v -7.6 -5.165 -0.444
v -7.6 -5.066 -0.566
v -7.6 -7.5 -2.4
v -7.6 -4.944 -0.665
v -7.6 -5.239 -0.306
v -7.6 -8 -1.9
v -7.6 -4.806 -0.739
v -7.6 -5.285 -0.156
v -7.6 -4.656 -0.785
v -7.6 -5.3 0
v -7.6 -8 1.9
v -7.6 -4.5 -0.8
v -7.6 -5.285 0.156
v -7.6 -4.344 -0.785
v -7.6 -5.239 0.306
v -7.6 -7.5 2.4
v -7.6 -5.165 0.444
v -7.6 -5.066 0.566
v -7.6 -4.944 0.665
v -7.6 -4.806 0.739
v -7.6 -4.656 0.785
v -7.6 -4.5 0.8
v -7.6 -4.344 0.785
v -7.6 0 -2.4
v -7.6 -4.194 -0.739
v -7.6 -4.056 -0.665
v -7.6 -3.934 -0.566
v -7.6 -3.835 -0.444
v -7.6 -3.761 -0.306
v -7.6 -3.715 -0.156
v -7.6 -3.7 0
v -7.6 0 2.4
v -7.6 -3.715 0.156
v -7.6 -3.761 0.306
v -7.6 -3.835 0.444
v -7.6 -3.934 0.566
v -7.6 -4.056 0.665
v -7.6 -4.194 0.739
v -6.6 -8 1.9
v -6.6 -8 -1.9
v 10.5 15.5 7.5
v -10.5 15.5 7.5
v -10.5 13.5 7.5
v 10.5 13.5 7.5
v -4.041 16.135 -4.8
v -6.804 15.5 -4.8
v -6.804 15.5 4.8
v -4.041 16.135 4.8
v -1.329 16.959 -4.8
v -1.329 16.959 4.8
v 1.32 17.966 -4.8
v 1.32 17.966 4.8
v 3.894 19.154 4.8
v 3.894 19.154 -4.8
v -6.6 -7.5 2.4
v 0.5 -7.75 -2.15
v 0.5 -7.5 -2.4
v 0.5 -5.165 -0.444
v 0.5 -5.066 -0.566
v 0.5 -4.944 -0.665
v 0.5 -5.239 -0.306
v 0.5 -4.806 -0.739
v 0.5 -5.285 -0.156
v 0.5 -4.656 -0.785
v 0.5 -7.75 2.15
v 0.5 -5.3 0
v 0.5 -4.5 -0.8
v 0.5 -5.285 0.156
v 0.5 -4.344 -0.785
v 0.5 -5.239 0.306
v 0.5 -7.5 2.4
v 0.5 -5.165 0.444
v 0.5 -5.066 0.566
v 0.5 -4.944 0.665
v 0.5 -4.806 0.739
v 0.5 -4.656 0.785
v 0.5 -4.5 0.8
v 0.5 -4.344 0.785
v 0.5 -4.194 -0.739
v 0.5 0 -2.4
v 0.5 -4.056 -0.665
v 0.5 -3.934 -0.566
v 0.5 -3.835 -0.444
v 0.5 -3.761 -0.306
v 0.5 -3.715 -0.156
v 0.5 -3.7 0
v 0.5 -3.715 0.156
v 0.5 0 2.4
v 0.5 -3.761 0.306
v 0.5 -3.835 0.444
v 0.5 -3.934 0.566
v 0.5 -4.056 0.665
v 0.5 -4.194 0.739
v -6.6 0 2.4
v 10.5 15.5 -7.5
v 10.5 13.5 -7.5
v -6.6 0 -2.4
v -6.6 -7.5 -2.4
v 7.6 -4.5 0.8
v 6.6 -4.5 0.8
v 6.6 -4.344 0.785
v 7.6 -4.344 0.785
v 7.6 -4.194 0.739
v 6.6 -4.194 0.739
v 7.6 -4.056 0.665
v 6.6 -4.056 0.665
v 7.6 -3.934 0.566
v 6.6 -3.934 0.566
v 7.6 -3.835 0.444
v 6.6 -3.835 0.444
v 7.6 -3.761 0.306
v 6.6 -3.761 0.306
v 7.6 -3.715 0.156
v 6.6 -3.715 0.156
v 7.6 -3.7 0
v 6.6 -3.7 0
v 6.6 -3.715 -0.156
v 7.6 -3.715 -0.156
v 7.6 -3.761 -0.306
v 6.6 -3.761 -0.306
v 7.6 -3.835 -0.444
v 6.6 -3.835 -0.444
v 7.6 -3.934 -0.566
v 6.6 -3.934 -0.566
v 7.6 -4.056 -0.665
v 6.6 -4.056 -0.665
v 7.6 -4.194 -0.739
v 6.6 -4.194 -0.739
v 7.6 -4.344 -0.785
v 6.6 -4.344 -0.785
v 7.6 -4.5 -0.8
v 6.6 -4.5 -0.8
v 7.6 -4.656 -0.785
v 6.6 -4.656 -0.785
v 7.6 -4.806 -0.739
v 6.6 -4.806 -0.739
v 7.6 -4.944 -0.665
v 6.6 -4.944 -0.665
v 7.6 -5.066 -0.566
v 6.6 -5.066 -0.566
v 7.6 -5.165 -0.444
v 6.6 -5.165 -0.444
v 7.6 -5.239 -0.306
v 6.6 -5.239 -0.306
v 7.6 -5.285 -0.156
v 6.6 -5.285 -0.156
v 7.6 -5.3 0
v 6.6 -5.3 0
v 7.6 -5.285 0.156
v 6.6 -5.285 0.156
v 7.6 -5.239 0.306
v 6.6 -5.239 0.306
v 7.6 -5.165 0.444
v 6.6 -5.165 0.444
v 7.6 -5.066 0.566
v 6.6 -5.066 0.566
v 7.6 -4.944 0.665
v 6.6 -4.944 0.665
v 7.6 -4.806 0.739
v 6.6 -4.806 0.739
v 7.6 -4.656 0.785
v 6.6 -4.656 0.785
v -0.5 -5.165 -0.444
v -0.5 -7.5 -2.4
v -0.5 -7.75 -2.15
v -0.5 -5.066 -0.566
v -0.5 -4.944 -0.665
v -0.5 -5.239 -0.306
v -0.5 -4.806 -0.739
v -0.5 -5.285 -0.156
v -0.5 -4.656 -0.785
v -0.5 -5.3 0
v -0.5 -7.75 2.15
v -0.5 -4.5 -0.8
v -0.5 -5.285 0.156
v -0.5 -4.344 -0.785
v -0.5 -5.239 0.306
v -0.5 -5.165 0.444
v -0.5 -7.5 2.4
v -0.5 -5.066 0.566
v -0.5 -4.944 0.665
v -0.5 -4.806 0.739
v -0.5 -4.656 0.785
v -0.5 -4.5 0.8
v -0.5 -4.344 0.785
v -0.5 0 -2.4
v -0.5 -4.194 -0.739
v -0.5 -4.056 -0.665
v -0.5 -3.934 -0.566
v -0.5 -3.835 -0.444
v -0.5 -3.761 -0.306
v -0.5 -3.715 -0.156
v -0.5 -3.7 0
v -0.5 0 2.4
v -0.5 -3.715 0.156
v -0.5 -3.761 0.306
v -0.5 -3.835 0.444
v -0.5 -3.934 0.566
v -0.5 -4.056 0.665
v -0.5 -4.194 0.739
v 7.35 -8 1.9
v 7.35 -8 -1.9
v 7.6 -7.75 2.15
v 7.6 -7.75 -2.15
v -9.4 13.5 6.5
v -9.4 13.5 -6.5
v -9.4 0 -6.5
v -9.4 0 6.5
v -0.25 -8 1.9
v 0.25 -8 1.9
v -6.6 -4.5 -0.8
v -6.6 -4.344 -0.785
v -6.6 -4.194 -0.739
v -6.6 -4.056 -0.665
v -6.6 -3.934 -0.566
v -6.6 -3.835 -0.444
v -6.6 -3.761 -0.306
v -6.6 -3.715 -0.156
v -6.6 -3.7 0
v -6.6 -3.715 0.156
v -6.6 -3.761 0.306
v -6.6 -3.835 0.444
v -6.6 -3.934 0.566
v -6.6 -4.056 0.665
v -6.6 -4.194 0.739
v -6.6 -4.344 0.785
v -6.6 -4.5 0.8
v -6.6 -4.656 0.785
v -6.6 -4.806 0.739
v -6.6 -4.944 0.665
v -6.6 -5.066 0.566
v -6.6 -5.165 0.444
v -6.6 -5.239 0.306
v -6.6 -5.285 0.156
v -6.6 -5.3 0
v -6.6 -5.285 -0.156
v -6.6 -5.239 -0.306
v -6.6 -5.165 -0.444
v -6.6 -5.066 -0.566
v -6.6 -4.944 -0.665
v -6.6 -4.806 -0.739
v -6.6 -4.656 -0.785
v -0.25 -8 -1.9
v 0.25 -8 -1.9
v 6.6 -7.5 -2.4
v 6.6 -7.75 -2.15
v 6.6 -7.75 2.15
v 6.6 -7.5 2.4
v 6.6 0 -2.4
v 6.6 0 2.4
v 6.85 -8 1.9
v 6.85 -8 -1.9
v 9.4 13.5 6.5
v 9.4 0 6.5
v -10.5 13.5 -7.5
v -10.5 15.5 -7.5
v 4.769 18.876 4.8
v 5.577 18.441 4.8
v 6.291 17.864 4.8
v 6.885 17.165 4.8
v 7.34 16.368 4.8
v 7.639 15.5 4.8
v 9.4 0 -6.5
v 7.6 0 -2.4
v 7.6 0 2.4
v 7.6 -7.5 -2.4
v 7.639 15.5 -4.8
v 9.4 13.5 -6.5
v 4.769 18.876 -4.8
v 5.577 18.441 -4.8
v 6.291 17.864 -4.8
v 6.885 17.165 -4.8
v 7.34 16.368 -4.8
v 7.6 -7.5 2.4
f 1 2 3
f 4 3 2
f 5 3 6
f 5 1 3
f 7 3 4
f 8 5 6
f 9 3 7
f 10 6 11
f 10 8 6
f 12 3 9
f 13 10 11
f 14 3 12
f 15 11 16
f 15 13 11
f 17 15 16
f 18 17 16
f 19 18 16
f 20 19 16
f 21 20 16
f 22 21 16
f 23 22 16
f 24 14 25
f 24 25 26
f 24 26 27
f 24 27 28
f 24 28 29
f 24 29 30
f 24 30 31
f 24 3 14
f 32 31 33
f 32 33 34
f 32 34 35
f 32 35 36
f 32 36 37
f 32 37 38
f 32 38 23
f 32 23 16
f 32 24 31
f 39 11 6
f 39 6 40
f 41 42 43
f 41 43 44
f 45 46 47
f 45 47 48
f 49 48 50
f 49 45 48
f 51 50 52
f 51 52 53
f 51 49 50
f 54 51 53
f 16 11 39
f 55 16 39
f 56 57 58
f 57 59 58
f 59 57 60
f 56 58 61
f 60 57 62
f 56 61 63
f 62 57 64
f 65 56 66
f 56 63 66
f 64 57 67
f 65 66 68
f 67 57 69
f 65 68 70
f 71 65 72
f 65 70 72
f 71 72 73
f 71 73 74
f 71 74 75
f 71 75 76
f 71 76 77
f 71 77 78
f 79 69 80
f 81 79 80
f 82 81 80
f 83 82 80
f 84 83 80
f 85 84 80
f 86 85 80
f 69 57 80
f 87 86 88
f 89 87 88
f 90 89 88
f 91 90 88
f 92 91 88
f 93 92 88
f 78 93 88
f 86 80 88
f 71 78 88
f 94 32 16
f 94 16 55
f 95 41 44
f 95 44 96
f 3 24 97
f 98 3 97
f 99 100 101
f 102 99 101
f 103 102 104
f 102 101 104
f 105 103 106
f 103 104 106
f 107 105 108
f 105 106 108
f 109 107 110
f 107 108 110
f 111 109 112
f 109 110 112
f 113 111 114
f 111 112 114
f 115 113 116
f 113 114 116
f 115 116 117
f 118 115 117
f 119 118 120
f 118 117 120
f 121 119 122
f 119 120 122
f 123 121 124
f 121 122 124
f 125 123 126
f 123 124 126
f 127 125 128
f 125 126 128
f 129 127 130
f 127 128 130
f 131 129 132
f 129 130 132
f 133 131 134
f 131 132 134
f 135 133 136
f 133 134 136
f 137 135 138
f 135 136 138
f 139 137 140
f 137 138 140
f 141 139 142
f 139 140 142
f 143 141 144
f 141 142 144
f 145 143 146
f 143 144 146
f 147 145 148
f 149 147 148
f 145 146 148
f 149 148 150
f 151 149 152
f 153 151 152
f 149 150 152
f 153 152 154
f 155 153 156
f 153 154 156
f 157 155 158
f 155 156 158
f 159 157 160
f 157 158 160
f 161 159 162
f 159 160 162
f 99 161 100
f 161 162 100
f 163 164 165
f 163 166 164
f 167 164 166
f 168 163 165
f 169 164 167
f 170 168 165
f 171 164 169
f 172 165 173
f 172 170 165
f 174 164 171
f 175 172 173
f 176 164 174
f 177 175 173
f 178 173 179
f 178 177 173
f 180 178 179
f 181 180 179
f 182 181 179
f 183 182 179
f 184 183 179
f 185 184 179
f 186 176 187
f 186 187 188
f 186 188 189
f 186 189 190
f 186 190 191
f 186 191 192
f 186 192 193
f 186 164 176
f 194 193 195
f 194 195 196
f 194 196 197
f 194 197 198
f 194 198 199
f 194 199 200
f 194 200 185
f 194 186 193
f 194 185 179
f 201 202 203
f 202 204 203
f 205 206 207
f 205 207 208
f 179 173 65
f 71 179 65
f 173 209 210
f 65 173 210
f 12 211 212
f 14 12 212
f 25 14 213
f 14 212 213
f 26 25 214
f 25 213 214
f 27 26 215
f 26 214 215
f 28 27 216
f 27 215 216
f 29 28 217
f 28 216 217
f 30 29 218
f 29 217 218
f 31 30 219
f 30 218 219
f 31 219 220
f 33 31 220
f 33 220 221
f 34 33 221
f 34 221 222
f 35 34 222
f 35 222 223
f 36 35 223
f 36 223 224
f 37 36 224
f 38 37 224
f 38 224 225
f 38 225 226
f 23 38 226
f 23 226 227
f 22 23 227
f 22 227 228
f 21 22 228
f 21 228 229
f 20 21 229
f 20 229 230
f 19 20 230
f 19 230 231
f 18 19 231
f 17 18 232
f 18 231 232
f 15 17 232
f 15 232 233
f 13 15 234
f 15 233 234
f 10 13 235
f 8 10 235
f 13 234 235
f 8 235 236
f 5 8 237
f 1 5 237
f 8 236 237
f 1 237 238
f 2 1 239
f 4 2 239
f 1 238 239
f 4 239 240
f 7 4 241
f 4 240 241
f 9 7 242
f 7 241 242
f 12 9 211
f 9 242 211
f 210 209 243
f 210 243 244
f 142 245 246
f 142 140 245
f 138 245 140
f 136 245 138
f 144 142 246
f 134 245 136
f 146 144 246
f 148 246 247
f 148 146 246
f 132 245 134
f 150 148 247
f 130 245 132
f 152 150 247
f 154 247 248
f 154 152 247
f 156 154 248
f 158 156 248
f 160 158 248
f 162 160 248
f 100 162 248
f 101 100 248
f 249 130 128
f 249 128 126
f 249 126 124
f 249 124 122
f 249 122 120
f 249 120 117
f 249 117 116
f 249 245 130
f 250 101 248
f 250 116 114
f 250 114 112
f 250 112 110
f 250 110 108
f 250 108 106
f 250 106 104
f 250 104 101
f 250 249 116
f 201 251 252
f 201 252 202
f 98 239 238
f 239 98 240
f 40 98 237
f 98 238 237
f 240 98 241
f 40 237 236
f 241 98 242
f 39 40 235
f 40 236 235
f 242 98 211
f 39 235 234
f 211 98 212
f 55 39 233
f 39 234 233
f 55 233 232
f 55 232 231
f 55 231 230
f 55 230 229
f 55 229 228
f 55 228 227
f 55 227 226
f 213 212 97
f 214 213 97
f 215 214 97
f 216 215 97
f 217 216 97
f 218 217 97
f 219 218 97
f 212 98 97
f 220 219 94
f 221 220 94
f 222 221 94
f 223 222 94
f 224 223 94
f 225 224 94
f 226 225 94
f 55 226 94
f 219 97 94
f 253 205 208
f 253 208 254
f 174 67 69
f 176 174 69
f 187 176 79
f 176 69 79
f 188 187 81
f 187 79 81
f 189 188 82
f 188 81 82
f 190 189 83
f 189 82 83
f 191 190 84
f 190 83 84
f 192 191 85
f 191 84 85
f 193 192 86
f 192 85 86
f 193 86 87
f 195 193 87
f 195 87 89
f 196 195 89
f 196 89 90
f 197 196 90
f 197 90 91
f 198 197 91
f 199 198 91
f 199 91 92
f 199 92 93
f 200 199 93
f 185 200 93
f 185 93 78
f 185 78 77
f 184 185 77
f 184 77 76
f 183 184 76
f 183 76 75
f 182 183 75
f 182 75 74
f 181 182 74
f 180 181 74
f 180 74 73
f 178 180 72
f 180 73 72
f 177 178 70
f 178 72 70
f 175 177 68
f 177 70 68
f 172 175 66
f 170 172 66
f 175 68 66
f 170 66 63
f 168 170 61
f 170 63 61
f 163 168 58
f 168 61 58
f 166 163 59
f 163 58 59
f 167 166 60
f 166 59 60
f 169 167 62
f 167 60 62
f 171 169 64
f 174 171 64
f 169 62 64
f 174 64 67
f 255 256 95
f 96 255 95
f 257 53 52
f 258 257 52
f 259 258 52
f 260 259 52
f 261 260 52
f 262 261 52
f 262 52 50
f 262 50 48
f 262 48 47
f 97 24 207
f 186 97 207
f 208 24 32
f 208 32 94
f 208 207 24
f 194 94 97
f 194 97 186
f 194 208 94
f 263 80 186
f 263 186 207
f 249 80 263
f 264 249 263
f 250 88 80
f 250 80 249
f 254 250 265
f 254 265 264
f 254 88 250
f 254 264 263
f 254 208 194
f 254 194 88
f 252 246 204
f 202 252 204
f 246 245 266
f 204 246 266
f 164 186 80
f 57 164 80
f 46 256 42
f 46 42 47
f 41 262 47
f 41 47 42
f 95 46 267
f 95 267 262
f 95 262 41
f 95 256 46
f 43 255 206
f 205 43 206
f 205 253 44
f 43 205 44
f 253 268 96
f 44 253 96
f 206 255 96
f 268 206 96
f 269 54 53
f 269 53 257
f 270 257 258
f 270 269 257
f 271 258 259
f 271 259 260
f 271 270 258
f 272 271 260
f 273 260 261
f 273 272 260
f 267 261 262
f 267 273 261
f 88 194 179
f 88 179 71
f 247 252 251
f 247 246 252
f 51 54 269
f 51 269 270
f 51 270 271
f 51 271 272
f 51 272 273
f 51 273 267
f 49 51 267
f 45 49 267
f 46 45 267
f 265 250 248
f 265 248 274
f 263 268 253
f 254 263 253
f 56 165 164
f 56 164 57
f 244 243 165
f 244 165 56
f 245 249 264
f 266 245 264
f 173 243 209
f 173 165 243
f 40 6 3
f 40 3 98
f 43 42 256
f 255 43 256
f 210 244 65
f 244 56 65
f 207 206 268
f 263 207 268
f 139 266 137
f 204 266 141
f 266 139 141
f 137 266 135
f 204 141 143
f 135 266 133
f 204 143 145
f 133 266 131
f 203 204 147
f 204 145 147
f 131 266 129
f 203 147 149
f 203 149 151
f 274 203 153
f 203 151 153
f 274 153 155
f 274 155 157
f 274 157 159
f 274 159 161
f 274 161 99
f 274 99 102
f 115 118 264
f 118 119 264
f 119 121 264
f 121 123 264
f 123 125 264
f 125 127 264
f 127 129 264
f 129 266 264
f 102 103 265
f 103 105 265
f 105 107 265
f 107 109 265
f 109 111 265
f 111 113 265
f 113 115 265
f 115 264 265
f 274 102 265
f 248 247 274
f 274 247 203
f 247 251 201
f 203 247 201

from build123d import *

# Parameters (mm, degrees)
BOSS_EXTRUDE1_DEPTH            = 9.6
SKETCH2_W                      = 21
SKETCH2_H                      = 15
BOSS_EXTRUDE2_DEPTH            = 2
SKETCH3_W                      = 18.8
SKETCH3_H                      = 13
BOSS_EXTRUDE3_DEPTH            = 13.5
SKETCH4_W                      = 1
SKETCH4_H                      = 4.8
BOSS_EXTRUDE4_DEPTH            = 8
SKETCH5_W                      = 1
SKETCH5_H                      = 4.8
BOSS_EXTRUDE5_DEPTH            = 8
SKETCH6_W                      = 1
SKETCH6_H                      = 4.8
BOSS_EXTRUDE6_DEPTH            = 8
F_1_6_1_6_DIAMETER_HOLE1_D     = 1.6
F_1_6_1_6_DIAMETER_HOLE1_DEPTH = 1
F_1_6_1_6_DIAMETER_HOLE2_D     = 1.6
F_1_6_1_6_DIAMETER_HOLE2_DEPTH = 1
F_1_6_1_6_DIAMETER_HOLE3_D     = 1.6
F_1_6_1_6_DIAMETER_HOLE3_DEPTH = 11
CHAMFER1_SIZE                  = 0.25
CHAMFER2_SIZE                  = 0.5


with BuildPart() as part:
    # Sketch1 → Boss-Extrude1 (new body)
    with BuildSketch(Plane(origin=(0, 0, -4.8), x_dir=(-1, 0, 0), z_dir=(0, 0, -1))):
        with BuildLine():
            Line((-7.639445546, 15.5), (6.803913489, 15.5))
            ThreePointArc((6.803913489, 15.5), (1.329165769, 16.958613053), (-3.894073755, 19.15364916))
            ThreePointArc((-3.894073755, 19.15364916), (-6.290531384, 17.863745283), (-7.639445546, 15.5))
        make_face()
    extrude(amount=-BOSS_EXTRUDE1_DEPTH)

    # Sketch2 → Boss-Extrude2 (add)
    with BuildSketch(Plane(origin=(0, 15.5, 0), x_dir=(1, 0, 0), z_dir=(0, 1, 0))):
        Rectangle(SKETCH2_W, SKETCH2_H)
    extrude(amount=-BOSS_EXTRUDE2_DEPTH)

    # Sketch3 → Boss-Extrude3 (add)
    with BuildSketch(Plane.XZ.offset(-13.5)):
        Rectangle(SKETCH3_W, SKETCH3_H)
    extrude(amount=BOSS_EXTRUDE3_DEPTH)

    # Sketch4 → Boss-Extrude4 (add)
    with BuildSketch(Plane.XZ):
        Rectangle(SKETCH4_W, SKETCH4_H)
    extrude(amount=BOSS_EXTRUDE4_DEPTH)

    # Sketch5 → Boss-Extrude5 (add)
    with BuildSketch(Plane.XZ):
        with Locations((7.1, 0)):
            Rectangle(SKETCH5_W, SKETCH5_H)
    extrude(amount=BOSS_EXTRUDE5_DEPTH)

    # Sketch6 → Boss-Extrude6 (add)
    with BuildSketch(Plane.XZ):
        with Locations((-7.1, 0)):
            Rectangle(SKETCH6_W, SKETCH6_H)
    extrude(amount=BOSS_EXTRUDE6_DEPTH)

    # Ø1.6 (1.6) Diameter Hole1
    with Locations(Plane.ZY.offset(7.6)):
        with Locations((0, -4.5)):
            Hole(F_1_6_1_6_DIAMETER_HOLE1_D / 2, depth=F_1_6_1_6_DIAMETER_HOLE1_DEPTH)

    # Ø1.6 (1.6) Diameter Hole2
    with Locations(Plane(origin=(7.6, 0, 0), x_dir=(0, 0, -1), z_dir=(1, 0, 0))):
        with Locations((0, -4.5)):
            Hole(F_1_6_1_6_DIAMETER_HOLE2_D / 2, depth=F_1_6_1_6_DIAMETER_HOLE2_DEPTH)

    # Ø1.6 (1.6) Diameter Hole3
    with Locations(Plane.ZY.offset(0.5)):
        with Locations((0, -4.5)):
            Hole(F_1_6_1_6_DIAMETER_HOLE3_D / 2, depth=F_1_6_1_6_DIAMETER_HOLE3_DEPTH)

    # Chamfer1
    chamfer1_edges = [part.edges().sort_by_distance(p)[0] for p in [
        (-0.5, -8, 0),
        (0.5, -8, 0),
        (6.6, -8, 0),
        (7.6, -8, 0),
    ]]
    chamfer(chamfer1_edges, length=CHAMFER1_SIZE)

    # Chamfer2
    chamfer2_edges = [part.edges().sort_by_distance(p)[0] for p in [
        (7.1, -8, 2.4),
        (-7.1, -8, -2.4),
        (7.1, -8, -2.4),
        (0, -8, -2.4),
        (-7.1, -8, 2.4),
        (0, -8, 2.4),
    ]]
    chamfer(chamfer2_edges, length=CHAMFER2_SIZE)


solid = part.part
